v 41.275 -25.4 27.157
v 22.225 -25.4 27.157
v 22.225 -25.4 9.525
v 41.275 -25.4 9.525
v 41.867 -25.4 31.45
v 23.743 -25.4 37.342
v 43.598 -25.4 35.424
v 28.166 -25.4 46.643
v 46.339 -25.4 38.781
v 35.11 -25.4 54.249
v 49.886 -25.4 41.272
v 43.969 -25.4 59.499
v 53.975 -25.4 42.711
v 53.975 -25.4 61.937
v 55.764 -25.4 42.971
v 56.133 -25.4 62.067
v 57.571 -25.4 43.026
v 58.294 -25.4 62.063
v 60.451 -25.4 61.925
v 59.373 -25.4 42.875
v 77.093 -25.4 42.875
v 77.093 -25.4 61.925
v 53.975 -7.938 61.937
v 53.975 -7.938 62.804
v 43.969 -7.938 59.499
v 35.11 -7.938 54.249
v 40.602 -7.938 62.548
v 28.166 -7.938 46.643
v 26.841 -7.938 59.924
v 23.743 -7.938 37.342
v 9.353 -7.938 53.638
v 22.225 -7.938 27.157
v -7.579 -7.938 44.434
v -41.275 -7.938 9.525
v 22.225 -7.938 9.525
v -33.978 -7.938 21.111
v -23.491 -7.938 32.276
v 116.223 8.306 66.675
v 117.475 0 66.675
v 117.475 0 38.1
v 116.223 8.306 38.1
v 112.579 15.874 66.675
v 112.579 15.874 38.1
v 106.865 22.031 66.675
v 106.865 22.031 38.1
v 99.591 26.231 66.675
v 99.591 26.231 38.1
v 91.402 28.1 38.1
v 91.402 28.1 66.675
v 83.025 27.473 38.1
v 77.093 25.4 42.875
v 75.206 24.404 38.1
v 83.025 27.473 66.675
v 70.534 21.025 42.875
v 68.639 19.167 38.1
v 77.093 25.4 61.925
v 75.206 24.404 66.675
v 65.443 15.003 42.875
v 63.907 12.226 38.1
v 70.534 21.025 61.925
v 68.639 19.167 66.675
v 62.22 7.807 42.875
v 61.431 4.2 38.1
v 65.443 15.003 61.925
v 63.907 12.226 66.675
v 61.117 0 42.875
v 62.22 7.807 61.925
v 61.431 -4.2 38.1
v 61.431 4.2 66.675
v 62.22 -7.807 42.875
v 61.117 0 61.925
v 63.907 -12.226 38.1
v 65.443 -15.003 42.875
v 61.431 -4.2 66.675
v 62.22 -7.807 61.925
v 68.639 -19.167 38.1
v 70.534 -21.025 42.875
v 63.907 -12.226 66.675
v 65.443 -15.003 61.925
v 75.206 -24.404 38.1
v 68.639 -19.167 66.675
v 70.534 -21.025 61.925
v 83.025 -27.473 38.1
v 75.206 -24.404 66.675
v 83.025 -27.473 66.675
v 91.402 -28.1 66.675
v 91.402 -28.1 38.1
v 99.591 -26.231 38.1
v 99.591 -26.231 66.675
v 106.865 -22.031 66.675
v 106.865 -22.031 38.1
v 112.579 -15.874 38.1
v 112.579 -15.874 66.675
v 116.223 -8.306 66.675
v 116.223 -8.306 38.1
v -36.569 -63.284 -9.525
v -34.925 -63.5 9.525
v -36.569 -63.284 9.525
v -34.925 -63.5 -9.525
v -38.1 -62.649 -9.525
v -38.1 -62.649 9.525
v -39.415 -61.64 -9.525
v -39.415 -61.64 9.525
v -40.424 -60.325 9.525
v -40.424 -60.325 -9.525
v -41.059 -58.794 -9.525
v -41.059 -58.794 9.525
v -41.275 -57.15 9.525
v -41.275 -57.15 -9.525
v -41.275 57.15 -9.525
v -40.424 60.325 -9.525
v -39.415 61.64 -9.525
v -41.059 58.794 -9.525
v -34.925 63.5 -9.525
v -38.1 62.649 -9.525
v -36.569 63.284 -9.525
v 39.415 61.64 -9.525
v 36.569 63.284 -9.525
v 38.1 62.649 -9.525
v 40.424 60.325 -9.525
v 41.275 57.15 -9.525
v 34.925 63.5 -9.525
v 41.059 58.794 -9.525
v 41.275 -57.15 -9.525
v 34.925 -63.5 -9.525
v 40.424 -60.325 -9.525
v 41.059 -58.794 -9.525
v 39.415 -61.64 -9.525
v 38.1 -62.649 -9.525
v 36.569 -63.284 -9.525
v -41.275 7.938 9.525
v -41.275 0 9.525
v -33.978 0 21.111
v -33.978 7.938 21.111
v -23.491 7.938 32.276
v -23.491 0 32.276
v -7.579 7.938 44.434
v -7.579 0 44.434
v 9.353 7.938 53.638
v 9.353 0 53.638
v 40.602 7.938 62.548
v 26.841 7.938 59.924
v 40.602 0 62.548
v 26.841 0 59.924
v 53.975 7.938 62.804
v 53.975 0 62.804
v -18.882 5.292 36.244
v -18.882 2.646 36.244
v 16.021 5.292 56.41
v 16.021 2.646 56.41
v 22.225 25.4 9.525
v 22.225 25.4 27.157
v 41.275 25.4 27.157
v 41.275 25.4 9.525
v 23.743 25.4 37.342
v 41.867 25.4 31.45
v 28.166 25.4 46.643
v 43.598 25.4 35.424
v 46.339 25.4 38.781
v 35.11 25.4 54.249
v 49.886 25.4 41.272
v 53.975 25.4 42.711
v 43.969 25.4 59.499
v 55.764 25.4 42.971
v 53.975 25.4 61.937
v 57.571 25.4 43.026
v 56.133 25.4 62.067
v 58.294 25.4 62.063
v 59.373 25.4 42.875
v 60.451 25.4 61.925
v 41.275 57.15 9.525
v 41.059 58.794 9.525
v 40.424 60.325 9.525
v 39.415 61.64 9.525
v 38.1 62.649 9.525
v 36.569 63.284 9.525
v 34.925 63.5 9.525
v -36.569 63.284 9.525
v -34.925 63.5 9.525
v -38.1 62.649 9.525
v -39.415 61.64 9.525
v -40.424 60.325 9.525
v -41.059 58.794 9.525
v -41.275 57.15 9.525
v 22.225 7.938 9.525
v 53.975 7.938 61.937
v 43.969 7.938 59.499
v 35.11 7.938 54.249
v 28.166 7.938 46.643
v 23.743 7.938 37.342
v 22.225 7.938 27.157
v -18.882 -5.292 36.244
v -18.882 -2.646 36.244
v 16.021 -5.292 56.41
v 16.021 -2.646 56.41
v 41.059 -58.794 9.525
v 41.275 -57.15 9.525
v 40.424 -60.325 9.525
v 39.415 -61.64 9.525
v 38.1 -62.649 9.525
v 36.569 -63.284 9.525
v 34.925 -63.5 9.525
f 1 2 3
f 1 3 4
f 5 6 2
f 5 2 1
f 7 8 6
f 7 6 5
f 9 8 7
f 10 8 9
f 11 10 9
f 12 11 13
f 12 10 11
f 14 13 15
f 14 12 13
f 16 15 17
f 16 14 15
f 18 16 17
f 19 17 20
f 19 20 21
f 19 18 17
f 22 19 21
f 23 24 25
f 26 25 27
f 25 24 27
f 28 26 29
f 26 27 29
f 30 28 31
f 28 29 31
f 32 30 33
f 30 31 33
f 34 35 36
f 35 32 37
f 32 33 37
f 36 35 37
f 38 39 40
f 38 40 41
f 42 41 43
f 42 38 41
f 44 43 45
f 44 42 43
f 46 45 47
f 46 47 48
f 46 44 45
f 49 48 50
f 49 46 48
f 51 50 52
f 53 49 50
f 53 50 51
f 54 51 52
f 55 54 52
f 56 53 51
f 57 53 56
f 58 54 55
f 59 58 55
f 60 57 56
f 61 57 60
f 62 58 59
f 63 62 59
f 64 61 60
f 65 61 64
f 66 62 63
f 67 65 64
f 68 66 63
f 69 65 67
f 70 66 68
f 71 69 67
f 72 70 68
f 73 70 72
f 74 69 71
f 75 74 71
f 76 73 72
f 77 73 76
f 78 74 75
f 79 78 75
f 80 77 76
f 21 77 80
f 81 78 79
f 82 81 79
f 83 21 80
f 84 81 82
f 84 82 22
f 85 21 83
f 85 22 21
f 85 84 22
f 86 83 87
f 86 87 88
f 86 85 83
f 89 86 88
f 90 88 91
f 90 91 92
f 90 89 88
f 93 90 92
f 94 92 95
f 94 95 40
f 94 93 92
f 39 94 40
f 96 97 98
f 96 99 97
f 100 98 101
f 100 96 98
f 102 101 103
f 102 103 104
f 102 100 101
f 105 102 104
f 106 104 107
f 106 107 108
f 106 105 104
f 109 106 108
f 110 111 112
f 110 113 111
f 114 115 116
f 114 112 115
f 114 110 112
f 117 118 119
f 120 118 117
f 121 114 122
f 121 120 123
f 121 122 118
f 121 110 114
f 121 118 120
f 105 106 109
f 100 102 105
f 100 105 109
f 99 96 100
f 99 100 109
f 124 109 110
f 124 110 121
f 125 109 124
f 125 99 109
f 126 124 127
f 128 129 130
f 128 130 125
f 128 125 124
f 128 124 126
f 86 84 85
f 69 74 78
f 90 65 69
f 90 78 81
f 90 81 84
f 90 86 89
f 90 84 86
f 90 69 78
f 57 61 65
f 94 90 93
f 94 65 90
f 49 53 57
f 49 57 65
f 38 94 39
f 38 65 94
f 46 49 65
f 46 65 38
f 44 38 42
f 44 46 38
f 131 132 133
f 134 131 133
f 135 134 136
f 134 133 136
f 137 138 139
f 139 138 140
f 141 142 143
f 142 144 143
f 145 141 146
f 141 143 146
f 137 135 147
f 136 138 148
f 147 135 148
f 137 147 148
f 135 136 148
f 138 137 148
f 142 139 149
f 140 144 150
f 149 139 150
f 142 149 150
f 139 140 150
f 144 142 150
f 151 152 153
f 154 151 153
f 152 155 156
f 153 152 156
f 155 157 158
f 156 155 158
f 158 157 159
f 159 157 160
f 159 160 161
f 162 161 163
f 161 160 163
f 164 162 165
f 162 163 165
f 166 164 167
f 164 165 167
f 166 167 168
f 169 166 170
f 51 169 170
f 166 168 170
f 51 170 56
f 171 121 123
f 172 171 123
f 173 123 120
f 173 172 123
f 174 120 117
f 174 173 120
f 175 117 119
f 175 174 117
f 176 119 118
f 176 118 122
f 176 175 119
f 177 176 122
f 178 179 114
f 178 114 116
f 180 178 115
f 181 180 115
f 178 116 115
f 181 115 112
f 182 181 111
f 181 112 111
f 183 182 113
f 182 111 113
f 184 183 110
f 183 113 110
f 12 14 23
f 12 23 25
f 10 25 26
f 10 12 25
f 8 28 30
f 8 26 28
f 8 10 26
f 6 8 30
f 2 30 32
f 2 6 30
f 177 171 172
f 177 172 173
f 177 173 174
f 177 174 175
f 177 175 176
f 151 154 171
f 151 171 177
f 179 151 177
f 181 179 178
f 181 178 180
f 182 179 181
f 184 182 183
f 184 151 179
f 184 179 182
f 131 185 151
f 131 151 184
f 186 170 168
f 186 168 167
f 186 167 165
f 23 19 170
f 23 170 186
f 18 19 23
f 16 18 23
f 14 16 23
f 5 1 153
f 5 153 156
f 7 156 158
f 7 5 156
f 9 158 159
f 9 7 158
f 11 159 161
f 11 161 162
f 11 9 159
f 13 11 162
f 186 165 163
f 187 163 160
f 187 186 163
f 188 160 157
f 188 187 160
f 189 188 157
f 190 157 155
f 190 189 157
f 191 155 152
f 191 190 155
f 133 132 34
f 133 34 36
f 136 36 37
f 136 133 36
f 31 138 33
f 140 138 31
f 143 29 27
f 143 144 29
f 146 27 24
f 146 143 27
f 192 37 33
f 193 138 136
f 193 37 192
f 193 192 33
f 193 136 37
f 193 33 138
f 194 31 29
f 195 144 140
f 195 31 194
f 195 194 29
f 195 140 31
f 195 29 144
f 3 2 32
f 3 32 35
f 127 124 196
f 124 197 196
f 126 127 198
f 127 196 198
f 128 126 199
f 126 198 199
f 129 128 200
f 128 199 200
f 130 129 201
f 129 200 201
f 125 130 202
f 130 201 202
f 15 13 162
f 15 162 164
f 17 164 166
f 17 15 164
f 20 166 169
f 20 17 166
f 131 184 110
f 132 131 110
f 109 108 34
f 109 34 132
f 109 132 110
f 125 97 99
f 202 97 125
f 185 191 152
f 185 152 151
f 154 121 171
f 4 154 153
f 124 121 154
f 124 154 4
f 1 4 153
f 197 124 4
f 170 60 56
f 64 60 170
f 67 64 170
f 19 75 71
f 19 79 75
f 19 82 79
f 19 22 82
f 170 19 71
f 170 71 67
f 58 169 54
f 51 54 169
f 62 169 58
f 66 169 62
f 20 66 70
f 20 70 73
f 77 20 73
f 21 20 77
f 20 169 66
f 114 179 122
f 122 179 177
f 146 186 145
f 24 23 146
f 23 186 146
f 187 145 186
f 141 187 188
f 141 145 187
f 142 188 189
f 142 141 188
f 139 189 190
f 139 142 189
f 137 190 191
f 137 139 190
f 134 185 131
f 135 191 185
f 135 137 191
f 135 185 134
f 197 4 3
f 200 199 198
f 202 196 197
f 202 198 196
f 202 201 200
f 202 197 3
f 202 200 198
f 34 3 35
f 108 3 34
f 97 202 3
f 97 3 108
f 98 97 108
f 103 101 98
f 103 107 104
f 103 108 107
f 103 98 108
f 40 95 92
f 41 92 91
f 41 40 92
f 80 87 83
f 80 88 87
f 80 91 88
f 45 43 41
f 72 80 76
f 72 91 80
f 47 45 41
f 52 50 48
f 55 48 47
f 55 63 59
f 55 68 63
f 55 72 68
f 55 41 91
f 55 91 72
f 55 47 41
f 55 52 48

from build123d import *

# Parameters (mm, degrees)
F1_DEPTH = 63.5
F2_DEPTH = 25.4
F3_DEPTH = 7.9375
F4_DEPTH = 25.4
F6_R     = 6.35


with BuildPart() as f1:
    # F0 (on Front) → F1 (new body, symmetric)
    with BuildSketch(Plane.XZ):
        Polygon((-41.275, 9.525), (-41.275, -9.525), (41.275, -9.525), (41.275, 9.525), (22.225, 9.525), align=None)
    extrude(amount=F1_DEPTH, both=True)

    # F0 (on Front) → F2 (join, symmetric)
    with BuildSketch(Plane.XZ):
        with BuildLine():
            Line((22.225, 9.525), (41.275, 9.525))
            Line((41.275, 9.525), (41.275, 27.156549))
            ThreePointArc((41.275, 27.156549), (44.853278, 37.196781), (53.975, 42.710809))
            Line((53.975, 42.710809), (53.975, 61.936932))
            ThreePointArc((53.975, 61.936932), (31.356178, 50.70298), (22.225, 27.156549))
            Line((22.225, 27.156549), (22.225, 9.525))
        make_face()
    extrude(amount=F2_DEPTH, both=True)

    # F0 (on Front) → F3 (join, symmetric)
    with BuildSketch(Plane.XZ):
        with BuildLine():
            add(Edge.make_bspline(
                [(-41.275, 9.525), (-28.28964, 37.114333), (17.647352, 65.702192), (53.975, 62.803717)],
                knots=[0, 0, 0, 0, 107.903289, 107.903289, 107.903289, 107.903289], degree=3))
            Line((-41.275, 9.525), (22.225, 9.525))
            Line((22.225, 9.525), (22.225, 27.156549))
            ThreePointArc((22.225, 27.156549), (31.356178, 50.70298), (53.975, 61.936932))
            Line((53.975, 61.936932), (53.975, 62.803717))
        make_face()
    extrude(amount=F3_DEPTH, both=True)

    # F0 (on Front) → F4 (join, symmetric)
    with BuildSketch(Plane.XZ):
        with BuildLine():
            ThreePointArc((60.450994, 61.9252), (57.21327, 62.081492), (53.975, 61.936932))
            Line((53.975, 61.936932), (53.975, 42.710809))
            ThreePointArc((53.975, 42.710809), (56.666725, 43.024192), (59.372532, 42.8752))
            Line((59.372532, 42.8752), (89.295853, 42.8752))
            Line((89.295853, 42.8752), (89.295853, 61.9252))
            Line((89.295853, 61.9252), (60.450994, 61.9252))
        make_face()
    extrude(amount=F4_DEPTH, both=True)

    # F0 (on Front) → F5 (revolve)
    with BuildSketch(Plane.XZ):
        Polygon((117.475, 66.675), (89.295853, 66.675), (89.295853, 61.9252), (89.295853, 42.8752), (89.295853, 38.1), (117.475, 38.1), align=None)
    revolve(axis=Axis((89.295853, 0, 52.3875), (0, 0, 1)))

    # F6
    f6_edges = [f1.edges().sort_by_distance(p)[0] for p in [
        (41.275, -63.5, 0),
        (-41.275, -63.5, 0),
        (-41.275, 63.5, 0),
        (41.275, 63.5, 0),
    ]]
    fillet(f6_edges, radius=F6_R)


solid = f1.part
